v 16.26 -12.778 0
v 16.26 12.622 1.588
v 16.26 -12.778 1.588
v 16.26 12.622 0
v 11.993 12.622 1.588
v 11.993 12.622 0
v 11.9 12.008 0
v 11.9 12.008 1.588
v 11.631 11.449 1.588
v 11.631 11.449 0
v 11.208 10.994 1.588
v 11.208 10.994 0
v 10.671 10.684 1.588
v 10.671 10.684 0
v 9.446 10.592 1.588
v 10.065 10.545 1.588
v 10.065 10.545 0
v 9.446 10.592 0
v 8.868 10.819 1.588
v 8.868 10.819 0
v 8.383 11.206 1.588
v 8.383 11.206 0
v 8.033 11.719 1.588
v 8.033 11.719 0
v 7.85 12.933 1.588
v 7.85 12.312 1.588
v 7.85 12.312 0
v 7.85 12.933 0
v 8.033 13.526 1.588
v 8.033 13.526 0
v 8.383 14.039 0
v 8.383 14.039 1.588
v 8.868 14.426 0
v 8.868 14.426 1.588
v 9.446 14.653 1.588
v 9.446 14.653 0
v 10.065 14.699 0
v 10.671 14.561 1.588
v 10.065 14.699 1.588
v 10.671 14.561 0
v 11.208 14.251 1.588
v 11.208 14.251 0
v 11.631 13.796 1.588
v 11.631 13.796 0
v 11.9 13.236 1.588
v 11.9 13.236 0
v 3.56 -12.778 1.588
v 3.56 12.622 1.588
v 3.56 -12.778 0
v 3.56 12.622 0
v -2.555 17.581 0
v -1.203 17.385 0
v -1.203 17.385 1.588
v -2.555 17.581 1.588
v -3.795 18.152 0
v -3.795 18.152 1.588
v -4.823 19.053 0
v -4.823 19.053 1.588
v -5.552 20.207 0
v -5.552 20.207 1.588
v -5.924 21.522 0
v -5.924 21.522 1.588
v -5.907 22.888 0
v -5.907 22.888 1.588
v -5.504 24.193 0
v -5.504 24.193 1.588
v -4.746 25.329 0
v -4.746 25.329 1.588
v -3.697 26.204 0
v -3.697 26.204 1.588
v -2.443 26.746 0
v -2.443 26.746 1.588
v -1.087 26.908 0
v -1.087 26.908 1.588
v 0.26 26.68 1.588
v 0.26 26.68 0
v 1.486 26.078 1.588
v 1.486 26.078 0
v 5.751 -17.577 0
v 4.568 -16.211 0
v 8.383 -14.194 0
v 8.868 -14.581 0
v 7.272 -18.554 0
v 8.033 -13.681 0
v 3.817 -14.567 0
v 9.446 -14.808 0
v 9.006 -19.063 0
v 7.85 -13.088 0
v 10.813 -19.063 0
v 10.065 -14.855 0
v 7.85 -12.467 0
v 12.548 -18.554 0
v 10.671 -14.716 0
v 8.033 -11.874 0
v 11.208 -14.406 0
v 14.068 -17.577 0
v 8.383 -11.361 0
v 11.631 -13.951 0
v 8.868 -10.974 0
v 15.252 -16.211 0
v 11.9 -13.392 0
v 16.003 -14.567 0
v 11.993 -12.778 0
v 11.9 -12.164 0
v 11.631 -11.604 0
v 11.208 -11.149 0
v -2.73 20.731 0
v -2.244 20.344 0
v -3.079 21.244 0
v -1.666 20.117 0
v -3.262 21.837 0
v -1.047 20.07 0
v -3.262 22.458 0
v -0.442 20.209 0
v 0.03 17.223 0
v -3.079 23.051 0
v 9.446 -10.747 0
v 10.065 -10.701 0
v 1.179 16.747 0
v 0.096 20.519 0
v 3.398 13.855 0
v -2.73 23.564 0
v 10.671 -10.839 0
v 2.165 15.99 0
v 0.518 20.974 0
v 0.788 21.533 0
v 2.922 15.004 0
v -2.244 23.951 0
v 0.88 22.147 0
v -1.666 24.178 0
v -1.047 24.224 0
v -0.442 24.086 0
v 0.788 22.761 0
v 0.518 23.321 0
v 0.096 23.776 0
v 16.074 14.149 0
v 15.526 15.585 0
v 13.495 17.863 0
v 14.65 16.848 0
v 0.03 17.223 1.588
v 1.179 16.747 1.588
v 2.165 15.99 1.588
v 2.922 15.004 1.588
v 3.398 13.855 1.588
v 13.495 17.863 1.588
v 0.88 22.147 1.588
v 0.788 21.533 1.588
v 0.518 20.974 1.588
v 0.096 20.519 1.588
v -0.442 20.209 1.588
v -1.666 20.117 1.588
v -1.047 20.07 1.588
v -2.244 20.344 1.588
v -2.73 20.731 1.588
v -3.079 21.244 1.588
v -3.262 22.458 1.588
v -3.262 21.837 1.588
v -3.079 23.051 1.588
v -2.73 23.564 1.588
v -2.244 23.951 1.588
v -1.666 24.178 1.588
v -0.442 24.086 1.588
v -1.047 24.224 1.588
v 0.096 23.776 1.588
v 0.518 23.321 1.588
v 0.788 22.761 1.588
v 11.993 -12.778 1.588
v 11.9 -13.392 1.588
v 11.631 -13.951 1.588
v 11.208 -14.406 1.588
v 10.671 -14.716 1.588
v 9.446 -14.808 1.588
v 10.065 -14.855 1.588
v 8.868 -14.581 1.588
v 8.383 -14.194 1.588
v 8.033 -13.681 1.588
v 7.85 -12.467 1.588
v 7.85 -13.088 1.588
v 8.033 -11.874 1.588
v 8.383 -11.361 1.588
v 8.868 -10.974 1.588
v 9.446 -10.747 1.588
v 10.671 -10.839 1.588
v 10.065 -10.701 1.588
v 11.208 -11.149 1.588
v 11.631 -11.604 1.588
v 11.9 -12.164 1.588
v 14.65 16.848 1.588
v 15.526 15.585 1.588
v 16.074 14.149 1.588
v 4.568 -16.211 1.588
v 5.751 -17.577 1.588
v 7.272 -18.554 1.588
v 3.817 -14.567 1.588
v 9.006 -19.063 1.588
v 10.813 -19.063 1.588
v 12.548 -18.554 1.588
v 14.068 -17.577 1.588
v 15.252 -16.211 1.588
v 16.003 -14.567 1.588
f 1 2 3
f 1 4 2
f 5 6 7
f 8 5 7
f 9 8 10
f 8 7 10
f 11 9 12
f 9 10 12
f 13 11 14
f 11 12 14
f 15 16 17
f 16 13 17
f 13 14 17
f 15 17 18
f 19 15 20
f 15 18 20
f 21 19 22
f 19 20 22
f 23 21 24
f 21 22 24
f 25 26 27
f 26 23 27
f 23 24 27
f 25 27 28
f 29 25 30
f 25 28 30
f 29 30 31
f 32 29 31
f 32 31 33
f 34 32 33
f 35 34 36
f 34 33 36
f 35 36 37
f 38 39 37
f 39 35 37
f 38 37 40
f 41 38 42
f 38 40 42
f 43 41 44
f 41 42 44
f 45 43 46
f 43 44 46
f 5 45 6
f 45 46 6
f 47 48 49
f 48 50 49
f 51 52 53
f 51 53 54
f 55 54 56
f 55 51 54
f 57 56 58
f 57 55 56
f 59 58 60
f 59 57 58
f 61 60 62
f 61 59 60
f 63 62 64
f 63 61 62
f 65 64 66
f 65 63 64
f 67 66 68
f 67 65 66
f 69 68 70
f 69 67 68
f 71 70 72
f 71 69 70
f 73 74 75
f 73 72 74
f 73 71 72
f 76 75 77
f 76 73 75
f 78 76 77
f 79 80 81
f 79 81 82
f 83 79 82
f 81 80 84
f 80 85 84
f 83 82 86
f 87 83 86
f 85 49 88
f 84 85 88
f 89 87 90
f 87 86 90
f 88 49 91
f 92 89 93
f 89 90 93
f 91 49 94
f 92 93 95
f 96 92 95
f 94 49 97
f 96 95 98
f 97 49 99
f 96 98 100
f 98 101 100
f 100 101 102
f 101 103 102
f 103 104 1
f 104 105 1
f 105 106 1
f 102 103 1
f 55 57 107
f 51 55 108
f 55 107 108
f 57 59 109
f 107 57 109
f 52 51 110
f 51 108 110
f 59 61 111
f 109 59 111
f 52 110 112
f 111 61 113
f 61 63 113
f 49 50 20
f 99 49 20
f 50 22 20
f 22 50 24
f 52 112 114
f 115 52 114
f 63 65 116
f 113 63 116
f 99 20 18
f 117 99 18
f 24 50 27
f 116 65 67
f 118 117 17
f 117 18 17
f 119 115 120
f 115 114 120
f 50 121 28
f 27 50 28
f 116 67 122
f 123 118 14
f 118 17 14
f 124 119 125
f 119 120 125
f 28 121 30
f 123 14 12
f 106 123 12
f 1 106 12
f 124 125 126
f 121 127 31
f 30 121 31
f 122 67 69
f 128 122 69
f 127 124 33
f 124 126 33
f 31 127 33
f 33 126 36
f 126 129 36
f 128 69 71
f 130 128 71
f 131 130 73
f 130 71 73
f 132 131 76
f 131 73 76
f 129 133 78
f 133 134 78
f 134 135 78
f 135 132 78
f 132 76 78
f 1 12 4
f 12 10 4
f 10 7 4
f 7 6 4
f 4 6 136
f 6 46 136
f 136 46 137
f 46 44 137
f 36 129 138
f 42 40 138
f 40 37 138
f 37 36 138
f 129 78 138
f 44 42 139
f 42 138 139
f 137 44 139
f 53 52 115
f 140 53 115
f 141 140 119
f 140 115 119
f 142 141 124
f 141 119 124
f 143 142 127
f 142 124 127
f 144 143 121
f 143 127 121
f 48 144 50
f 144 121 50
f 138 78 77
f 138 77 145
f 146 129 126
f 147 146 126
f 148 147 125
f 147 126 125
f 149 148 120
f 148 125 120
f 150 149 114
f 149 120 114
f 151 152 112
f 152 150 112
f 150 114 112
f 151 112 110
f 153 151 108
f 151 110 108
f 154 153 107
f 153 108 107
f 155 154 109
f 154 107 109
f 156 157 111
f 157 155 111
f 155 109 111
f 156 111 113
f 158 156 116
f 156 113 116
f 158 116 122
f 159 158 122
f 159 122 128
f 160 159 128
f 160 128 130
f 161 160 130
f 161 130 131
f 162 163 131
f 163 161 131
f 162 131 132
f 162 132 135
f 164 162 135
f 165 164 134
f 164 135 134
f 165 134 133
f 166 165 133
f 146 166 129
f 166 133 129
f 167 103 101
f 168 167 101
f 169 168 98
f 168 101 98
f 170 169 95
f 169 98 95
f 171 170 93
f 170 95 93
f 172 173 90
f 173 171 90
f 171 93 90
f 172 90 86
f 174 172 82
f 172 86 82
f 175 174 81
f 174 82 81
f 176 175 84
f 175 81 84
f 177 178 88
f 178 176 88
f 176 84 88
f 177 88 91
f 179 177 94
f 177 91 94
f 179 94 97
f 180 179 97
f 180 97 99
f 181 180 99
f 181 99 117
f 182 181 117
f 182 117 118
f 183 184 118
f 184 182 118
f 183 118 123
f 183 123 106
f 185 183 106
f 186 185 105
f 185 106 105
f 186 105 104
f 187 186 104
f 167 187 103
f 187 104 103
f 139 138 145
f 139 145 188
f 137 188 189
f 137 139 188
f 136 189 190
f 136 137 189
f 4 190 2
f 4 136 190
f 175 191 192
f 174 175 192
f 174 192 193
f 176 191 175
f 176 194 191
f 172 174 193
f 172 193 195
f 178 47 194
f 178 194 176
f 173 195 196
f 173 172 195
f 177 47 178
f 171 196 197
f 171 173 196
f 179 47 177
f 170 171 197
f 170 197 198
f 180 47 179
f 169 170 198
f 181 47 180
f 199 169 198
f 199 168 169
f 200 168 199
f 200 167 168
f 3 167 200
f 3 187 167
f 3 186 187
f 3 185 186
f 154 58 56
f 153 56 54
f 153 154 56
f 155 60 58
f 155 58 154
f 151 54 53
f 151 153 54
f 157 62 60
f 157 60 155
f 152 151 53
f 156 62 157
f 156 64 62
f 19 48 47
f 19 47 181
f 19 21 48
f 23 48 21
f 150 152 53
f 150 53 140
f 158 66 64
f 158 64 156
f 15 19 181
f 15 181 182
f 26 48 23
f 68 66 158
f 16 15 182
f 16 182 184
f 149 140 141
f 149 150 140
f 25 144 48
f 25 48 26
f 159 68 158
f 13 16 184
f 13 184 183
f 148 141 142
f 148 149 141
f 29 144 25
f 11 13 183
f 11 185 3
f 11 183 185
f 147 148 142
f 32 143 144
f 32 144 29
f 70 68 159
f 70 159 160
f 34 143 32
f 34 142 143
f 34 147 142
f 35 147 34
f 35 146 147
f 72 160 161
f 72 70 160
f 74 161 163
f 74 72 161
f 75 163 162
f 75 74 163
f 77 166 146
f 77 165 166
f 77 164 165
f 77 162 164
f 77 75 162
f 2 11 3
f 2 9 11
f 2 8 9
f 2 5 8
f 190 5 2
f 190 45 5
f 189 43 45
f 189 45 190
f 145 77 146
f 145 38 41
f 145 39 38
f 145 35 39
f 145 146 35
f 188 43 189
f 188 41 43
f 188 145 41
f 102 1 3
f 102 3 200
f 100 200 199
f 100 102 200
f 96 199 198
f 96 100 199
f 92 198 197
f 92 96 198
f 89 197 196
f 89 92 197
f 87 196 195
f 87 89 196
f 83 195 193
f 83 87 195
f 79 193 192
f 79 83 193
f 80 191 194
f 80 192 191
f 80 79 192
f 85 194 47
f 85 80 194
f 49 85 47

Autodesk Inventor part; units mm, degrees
ref_plane "YZ Plane" through (0, 0, 0) normal (1, 0, 0) x (0, 1, 0)
ref_plane "XZ Plane" through (0, 0, 0) normal (0, 1, 0) x (-1, 0, 0)
ref_plane "XY Plane" through (0, 0, 0) normal (0, 0, 1) x (1, 0, 0)
sketch "Sketch1" plane through (0, 0, 0) normal (0, 0, 1) x (1, 0, 0)
  circle A0 centre (9.9098, 12.6224) radius 2.0828
  circle A1 centre (9.9098, -12.7776) radius 2.0828
  arc A2 (16.2598, 12.6224) -> (13.495, 17.8634) centre (9.9098, 12.6224) ccw
  arc A3 (3.5598, -12.7776) -> (16.2598, -12.7776) centre (9.9098, -12.7776) ccw
  line L0 (3.5598, 12.6224) -> (3.5598, -12.7776)
  line L1 (16.2598, 12.6224) -> (16.2598, -12.7776)
  circle A4 centre (-1.2027, 22.1474) radius 2.0828
  arc A5 (1.4862, 26.0782) -> (-1.2027, 17.3849) centre (-1.2027, 22.1474) ccw
  arc A6 (3.5598, 12.6224) -> (-1.2027, 17.3849) centre (-1.2027, 12.6224) ccw
  line L2 (1.4862, 26.0782) -> (13.495, 17.8634)
  point P0 (0, 0)
  dimension "d0" = 4.1656
  dimension "d1" = 12.7
  dimension "d2" = 9.525
extrude "Extrusion1" add sketch "Sketch1" along normal blind 1.5875
properties part number "brace_gusset" material "Acetal Resin, White"
